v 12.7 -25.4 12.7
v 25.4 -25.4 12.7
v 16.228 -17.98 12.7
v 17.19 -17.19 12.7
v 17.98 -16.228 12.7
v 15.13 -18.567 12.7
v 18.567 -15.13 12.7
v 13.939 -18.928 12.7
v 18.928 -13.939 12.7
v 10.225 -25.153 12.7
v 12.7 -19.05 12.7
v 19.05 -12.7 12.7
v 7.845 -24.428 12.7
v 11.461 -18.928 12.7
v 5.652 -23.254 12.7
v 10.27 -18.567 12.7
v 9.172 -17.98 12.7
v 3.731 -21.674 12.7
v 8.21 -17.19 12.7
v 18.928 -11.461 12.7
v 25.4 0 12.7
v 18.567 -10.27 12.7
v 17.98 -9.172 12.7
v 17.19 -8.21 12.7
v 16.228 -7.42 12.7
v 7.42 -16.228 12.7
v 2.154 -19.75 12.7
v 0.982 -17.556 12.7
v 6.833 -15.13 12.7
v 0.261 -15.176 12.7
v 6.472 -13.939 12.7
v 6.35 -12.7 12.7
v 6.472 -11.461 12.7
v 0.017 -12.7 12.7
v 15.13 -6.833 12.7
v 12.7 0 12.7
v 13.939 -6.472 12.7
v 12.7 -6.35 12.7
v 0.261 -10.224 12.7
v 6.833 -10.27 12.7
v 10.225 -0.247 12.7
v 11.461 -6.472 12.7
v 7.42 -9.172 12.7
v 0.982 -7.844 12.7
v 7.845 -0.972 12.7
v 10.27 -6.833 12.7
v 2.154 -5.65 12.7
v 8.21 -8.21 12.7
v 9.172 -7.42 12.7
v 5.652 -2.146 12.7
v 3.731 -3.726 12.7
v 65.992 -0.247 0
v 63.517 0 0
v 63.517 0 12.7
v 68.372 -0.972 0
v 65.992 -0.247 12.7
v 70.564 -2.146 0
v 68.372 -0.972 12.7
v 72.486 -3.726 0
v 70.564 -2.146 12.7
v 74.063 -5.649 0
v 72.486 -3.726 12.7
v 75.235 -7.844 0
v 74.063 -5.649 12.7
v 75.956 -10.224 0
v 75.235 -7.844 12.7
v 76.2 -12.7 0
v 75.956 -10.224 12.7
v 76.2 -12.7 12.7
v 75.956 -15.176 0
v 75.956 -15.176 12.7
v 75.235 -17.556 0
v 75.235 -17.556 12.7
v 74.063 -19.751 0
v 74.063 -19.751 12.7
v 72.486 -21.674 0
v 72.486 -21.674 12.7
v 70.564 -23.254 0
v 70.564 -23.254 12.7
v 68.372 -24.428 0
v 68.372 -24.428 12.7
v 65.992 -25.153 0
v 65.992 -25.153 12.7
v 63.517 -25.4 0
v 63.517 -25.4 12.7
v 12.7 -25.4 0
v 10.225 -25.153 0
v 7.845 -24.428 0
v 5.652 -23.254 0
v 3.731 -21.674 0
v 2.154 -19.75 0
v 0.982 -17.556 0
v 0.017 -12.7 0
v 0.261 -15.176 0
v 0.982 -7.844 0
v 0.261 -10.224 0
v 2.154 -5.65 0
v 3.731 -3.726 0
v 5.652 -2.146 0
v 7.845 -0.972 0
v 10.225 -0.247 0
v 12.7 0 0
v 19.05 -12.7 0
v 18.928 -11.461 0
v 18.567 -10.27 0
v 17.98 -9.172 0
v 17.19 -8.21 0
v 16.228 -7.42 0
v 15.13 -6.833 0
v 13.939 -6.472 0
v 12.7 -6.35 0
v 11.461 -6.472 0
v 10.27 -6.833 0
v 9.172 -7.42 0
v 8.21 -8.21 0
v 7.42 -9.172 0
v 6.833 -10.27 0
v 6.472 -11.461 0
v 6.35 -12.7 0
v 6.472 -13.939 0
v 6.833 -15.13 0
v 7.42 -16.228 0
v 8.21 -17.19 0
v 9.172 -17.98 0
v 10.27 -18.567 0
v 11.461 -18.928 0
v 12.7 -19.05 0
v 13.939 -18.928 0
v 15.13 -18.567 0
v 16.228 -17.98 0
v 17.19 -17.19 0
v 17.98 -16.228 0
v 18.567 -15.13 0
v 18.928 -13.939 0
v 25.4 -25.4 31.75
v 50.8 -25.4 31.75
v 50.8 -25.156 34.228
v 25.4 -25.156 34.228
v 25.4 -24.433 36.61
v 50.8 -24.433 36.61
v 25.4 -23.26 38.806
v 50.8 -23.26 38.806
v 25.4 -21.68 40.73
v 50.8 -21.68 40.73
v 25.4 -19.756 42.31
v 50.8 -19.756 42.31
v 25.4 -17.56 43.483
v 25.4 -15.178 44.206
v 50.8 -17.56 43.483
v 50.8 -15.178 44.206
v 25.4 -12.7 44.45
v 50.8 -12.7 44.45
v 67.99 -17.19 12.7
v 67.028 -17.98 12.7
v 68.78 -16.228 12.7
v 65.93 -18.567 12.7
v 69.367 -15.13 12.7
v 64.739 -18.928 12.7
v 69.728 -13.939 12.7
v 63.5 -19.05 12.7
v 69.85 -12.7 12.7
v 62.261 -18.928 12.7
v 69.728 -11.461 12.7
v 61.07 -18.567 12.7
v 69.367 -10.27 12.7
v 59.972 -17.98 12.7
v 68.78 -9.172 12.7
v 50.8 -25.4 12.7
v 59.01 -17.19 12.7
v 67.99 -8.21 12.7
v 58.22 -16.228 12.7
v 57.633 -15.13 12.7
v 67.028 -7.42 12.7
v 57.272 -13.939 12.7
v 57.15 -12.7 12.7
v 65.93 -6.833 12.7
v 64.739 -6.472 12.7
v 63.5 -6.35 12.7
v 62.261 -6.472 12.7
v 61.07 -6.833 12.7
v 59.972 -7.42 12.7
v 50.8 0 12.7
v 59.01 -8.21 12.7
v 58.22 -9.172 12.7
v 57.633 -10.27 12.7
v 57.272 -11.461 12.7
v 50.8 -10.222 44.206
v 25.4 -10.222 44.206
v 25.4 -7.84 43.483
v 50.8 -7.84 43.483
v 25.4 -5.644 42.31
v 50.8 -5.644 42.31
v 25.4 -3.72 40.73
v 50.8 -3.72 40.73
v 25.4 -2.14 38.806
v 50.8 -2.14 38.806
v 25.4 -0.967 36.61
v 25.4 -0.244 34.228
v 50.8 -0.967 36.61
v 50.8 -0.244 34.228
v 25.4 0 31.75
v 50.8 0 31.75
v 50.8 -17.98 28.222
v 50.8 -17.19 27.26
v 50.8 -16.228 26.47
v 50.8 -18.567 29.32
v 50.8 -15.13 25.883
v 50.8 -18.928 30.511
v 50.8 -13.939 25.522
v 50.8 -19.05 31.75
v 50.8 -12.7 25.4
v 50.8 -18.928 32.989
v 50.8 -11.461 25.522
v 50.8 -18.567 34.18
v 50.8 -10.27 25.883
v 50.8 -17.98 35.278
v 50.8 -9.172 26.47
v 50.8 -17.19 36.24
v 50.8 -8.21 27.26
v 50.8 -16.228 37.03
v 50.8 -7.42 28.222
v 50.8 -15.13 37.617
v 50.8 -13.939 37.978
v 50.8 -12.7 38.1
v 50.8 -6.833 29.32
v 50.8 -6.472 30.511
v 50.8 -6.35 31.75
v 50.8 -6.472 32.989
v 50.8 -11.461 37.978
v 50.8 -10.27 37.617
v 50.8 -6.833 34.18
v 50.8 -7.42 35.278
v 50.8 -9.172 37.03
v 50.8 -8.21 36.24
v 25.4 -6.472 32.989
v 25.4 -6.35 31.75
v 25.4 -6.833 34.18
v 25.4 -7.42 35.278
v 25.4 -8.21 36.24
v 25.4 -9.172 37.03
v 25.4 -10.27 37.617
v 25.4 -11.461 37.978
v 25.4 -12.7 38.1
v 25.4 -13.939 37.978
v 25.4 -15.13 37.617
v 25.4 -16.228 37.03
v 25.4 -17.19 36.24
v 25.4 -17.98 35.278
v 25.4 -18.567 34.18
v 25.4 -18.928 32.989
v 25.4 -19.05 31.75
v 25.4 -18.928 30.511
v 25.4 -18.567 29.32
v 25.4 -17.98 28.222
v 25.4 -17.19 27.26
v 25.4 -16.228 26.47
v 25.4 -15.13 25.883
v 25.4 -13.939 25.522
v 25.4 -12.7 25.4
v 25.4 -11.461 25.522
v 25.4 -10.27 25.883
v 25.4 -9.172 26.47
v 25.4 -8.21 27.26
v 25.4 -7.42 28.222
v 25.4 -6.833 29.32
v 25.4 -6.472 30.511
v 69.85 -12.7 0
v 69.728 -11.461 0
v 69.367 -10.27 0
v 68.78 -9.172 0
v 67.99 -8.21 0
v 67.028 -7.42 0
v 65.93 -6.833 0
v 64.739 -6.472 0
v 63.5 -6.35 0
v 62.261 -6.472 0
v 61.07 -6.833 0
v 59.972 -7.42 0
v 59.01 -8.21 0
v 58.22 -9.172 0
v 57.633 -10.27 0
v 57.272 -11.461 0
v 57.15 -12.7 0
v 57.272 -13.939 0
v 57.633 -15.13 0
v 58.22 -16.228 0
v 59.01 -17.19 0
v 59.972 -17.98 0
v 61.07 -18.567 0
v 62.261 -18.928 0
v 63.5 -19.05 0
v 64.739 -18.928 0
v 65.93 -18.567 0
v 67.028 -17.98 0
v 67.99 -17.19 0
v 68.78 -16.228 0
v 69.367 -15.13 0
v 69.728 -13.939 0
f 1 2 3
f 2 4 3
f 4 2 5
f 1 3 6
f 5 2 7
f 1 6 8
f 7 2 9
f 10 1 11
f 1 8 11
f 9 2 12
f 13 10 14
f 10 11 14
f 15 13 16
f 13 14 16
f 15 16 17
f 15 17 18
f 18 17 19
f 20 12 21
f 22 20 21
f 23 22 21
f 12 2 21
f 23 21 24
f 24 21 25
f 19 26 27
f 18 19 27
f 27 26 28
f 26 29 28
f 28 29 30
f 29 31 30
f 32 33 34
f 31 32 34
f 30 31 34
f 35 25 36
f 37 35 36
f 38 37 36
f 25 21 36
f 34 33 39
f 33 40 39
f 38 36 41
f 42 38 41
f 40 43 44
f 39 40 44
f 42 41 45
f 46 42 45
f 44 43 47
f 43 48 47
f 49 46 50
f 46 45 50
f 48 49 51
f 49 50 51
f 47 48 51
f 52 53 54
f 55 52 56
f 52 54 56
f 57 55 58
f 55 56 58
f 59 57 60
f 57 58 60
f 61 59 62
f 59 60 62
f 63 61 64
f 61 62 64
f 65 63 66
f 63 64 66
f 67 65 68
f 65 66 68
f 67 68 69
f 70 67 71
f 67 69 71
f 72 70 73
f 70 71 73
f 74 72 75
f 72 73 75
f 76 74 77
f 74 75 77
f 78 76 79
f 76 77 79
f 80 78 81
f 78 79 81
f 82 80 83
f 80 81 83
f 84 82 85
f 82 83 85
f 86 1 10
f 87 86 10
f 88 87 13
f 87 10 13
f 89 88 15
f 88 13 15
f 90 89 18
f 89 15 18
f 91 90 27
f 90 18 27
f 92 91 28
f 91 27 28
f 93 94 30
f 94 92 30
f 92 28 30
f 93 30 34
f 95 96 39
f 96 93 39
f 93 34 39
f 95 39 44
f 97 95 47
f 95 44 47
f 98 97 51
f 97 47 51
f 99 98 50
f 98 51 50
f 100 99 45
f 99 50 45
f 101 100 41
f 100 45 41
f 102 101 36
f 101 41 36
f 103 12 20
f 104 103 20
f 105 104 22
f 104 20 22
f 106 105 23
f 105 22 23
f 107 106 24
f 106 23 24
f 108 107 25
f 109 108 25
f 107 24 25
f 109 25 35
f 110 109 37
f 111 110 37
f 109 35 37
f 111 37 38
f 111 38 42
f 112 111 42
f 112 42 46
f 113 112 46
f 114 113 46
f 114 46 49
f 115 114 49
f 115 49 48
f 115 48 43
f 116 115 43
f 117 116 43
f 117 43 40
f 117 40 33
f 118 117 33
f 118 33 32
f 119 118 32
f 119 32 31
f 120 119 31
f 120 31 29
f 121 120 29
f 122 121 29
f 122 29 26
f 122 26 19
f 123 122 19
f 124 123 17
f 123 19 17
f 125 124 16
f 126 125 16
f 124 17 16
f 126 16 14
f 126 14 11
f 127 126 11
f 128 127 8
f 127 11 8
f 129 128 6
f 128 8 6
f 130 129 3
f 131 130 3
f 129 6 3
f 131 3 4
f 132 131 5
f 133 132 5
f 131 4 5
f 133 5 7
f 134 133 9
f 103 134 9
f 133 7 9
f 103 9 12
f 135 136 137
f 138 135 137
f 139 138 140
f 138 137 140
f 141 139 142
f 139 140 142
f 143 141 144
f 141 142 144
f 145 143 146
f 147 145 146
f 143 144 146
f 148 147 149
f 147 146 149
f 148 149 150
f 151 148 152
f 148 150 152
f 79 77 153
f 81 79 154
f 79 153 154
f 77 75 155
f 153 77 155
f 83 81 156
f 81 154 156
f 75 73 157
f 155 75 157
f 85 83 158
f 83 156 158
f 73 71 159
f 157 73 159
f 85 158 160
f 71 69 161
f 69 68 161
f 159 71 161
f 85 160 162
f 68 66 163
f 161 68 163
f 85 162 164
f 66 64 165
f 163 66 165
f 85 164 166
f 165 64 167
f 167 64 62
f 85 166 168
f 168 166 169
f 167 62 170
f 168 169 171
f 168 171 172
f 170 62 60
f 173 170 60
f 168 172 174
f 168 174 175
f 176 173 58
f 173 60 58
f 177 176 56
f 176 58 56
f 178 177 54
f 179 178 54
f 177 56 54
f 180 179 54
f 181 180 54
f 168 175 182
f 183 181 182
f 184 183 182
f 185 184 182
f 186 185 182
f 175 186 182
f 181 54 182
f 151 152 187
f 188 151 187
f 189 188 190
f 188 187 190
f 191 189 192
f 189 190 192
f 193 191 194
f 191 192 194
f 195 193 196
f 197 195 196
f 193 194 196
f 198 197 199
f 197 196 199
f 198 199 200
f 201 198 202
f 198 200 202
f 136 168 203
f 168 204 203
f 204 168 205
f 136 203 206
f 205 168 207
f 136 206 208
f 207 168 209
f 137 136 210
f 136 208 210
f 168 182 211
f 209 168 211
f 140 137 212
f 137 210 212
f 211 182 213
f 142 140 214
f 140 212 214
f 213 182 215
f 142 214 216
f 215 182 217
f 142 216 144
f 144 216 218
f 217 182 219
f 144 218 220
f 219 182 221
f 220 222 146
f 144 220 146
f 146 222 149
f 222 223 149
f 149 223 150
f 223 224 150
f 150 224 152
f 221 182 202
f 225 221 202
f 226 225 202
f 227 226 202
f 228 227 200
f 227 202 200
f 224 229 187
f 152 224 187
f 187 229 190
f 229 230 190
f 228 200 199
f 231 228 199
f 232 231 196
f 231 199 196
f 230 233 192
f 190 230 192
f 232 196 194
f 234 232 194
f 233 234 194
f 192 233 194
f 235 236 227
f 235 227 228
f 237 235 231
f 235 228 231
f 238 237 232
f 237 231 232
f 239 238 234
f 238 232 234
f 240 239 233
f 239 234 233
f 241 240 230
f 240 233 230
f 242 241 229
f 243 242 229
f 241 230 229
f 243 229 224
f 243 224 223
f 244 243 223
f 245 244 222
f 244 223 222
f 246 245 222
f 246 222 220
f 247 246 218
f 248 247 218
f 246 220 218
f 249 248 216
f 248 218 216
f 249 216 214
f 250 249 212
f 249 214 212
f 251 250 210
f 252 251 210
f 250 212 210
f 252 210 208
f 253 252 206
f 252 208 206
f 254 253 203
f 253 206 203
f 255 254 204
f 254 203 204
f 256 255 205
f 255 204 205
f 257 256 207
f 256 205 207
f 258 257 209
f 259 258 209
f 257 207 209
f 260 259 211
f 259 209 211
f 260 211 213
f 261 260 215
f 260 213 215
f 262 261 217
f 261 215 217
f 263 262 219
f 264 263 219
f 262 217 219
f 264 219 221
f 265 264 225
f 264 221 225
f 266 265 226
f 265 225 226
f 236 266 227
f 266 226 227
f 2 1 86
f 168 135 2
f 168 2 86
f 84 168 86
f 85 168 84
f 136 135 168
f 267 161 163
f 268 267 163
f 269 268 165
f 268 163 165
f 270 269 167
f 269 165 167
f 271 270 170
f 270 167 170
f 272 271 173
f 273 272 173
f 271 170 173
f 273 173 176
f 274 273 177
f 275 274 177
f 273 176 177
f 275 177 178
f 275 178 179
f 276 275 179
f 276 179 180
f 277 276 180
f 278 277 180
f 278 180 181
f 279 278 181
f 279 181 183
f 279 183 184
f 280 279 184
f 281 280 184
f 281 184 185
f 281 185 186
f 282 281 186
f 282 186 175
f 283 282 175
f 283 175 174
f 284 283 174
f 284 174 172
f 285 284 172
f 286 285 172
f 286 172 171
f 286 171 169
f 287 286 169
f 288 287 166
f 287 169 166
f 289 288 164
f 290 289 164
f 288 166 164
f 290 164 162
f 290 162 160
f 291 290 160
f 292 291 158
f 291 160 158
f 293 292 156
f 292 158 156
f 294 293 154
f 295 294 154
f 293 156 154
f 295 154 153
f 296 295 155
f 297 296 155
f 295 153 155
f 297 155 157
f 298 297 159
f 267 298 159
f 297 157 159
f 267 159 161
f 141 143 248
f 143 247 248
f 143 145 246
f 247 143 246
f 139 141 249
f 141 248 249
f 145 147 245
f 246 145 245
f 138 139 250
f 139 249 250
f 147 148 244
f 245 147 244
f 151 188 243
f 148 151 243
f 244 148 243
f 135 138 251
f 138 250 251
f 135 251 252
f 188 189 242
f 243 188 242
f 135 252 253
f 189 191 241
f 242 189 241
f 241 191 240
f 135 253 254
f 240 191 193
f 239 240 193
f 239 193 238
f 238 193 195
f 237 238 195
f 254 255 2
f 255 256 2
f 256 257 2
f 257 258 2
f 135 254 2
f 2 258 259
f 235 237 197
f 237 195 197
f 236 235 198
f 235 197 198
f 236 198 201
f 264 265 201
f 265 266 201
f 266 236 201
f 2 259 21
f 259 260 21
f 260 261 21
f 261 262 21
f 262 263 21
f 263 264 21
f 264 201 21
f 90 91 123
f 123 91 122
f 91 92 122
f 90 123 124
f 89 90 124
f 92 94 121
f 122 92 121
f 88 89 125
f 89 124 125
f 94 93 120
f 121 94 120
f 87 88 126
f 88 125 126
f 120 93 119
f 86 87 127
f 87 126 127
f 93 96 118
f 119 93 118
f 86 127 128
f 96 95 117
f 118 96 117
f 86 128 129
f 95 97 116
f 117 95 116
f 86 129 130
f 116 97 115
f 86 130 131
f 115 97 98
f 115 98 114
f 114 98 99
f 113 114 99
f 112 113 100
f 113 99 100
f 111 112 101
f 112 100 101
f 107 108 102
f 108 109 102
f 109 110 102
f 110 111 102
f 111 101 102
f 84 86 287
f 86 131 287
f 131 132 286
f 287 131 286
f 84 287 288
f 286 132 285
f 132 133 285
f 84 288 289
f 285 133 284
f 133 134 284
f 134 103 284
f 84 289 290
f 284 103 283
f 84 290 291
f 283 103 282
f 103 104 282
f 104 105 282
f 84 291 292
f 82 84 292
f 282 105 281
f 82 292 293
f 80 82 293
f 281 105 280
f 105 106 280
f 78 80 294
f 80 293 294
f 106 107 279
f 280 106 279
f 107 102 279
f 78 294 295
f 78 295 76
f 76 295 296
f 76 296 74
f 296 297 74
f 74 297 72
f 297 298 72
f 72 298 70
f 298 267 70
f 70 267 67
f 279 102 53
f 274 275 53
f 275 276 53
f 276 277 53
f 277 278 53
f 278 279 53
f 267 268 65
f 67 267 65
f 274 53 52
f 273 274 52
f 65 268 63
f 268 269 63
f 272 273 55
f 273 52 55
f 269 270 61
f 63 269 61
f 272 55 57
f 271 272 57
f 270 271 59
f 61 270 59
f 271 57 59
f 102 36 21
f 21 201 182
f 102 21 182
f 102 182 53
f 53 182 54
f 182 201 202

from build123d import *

# Parameters (mm, degrees)
F1_DEPTH = 25.4
F2_R     = 6.35
F3_DEPTH = 25.4
F4_R     = 6.35
F5_DEPTH = 25.4


with BuildPart() as f1:
    # F0 (on Front) → F1 (new body)
    with BuildSketch(Plane.XZ):
        Polygon((0, 12.7), (0, 0), (76.2, 0), (76.2, 12.7), (50.8, 12.7), (50.8, 44.45), (25.4, 44.45), (25.4, 12.7), align=None)
    extrude(amount=F1_DEPTH)

    # F2 (on face) → F3 (cut)
    with BuildSketch(Plane.YZ.offset(50.8)):
        with BuildLine():
            ThreePointArc((-25.4, 31.75), (-21.680256, 40.730256), (-12.7, 44.45))
            Line((-12.7, 44.45), (-25.4, 44.45))
            Line((-25.4, 44.45), (-25.4, 31.75))
        make_face()
        with BuildLine():
            ThreePointArc((-12.7, 44.45), (-3.719744, 40.730256), (0, 31.75))
            Line((0, 31.75), (0, 44.45))
            Line((0, 44.45), (-12.7, 44.45))
        make_face()
        with Locations((-12.7, 31.75)):
            Circle(F2_R)
    extrude(amount=-F3_DEPTH, mode=Mode.SUBTRACT)

    # F4 (on face) → F5 (cut)
    with BuildSketch(Plane.XY.offset(12.7)):
        with Locations((63.499989, -12.7)):
            Circle(F4_R)
        with Locations((12.7, -12.7)):
            Circle(F4_R)
        with BuildLine():
            ThreePointArc((63.5, 1.1e-05), (76.2, -12.7), (63.5, -25.400011))
            Line((63.5, -25.400011), (94.457269, -25.400011))
            Line((94.457269, -25.400011), (94.457269, 0))
            Line((94.457269, 0), (63.5, 1.1e-05))
        make_face()
        with BuildLine():
            ThreePointArc((12.7, -25.4), (0.016976, -12.7), (12.7, 0))
            Line((12.7, 0), (0, 0))
            Line((0, 0), (0, -25.4))
            Line((0, -25.4), (12.7, -25.4))
        make_face()
    extrude(amount=-F5_DEPTH, mode=Mode.SUBTRACT)


solid = f1.part
